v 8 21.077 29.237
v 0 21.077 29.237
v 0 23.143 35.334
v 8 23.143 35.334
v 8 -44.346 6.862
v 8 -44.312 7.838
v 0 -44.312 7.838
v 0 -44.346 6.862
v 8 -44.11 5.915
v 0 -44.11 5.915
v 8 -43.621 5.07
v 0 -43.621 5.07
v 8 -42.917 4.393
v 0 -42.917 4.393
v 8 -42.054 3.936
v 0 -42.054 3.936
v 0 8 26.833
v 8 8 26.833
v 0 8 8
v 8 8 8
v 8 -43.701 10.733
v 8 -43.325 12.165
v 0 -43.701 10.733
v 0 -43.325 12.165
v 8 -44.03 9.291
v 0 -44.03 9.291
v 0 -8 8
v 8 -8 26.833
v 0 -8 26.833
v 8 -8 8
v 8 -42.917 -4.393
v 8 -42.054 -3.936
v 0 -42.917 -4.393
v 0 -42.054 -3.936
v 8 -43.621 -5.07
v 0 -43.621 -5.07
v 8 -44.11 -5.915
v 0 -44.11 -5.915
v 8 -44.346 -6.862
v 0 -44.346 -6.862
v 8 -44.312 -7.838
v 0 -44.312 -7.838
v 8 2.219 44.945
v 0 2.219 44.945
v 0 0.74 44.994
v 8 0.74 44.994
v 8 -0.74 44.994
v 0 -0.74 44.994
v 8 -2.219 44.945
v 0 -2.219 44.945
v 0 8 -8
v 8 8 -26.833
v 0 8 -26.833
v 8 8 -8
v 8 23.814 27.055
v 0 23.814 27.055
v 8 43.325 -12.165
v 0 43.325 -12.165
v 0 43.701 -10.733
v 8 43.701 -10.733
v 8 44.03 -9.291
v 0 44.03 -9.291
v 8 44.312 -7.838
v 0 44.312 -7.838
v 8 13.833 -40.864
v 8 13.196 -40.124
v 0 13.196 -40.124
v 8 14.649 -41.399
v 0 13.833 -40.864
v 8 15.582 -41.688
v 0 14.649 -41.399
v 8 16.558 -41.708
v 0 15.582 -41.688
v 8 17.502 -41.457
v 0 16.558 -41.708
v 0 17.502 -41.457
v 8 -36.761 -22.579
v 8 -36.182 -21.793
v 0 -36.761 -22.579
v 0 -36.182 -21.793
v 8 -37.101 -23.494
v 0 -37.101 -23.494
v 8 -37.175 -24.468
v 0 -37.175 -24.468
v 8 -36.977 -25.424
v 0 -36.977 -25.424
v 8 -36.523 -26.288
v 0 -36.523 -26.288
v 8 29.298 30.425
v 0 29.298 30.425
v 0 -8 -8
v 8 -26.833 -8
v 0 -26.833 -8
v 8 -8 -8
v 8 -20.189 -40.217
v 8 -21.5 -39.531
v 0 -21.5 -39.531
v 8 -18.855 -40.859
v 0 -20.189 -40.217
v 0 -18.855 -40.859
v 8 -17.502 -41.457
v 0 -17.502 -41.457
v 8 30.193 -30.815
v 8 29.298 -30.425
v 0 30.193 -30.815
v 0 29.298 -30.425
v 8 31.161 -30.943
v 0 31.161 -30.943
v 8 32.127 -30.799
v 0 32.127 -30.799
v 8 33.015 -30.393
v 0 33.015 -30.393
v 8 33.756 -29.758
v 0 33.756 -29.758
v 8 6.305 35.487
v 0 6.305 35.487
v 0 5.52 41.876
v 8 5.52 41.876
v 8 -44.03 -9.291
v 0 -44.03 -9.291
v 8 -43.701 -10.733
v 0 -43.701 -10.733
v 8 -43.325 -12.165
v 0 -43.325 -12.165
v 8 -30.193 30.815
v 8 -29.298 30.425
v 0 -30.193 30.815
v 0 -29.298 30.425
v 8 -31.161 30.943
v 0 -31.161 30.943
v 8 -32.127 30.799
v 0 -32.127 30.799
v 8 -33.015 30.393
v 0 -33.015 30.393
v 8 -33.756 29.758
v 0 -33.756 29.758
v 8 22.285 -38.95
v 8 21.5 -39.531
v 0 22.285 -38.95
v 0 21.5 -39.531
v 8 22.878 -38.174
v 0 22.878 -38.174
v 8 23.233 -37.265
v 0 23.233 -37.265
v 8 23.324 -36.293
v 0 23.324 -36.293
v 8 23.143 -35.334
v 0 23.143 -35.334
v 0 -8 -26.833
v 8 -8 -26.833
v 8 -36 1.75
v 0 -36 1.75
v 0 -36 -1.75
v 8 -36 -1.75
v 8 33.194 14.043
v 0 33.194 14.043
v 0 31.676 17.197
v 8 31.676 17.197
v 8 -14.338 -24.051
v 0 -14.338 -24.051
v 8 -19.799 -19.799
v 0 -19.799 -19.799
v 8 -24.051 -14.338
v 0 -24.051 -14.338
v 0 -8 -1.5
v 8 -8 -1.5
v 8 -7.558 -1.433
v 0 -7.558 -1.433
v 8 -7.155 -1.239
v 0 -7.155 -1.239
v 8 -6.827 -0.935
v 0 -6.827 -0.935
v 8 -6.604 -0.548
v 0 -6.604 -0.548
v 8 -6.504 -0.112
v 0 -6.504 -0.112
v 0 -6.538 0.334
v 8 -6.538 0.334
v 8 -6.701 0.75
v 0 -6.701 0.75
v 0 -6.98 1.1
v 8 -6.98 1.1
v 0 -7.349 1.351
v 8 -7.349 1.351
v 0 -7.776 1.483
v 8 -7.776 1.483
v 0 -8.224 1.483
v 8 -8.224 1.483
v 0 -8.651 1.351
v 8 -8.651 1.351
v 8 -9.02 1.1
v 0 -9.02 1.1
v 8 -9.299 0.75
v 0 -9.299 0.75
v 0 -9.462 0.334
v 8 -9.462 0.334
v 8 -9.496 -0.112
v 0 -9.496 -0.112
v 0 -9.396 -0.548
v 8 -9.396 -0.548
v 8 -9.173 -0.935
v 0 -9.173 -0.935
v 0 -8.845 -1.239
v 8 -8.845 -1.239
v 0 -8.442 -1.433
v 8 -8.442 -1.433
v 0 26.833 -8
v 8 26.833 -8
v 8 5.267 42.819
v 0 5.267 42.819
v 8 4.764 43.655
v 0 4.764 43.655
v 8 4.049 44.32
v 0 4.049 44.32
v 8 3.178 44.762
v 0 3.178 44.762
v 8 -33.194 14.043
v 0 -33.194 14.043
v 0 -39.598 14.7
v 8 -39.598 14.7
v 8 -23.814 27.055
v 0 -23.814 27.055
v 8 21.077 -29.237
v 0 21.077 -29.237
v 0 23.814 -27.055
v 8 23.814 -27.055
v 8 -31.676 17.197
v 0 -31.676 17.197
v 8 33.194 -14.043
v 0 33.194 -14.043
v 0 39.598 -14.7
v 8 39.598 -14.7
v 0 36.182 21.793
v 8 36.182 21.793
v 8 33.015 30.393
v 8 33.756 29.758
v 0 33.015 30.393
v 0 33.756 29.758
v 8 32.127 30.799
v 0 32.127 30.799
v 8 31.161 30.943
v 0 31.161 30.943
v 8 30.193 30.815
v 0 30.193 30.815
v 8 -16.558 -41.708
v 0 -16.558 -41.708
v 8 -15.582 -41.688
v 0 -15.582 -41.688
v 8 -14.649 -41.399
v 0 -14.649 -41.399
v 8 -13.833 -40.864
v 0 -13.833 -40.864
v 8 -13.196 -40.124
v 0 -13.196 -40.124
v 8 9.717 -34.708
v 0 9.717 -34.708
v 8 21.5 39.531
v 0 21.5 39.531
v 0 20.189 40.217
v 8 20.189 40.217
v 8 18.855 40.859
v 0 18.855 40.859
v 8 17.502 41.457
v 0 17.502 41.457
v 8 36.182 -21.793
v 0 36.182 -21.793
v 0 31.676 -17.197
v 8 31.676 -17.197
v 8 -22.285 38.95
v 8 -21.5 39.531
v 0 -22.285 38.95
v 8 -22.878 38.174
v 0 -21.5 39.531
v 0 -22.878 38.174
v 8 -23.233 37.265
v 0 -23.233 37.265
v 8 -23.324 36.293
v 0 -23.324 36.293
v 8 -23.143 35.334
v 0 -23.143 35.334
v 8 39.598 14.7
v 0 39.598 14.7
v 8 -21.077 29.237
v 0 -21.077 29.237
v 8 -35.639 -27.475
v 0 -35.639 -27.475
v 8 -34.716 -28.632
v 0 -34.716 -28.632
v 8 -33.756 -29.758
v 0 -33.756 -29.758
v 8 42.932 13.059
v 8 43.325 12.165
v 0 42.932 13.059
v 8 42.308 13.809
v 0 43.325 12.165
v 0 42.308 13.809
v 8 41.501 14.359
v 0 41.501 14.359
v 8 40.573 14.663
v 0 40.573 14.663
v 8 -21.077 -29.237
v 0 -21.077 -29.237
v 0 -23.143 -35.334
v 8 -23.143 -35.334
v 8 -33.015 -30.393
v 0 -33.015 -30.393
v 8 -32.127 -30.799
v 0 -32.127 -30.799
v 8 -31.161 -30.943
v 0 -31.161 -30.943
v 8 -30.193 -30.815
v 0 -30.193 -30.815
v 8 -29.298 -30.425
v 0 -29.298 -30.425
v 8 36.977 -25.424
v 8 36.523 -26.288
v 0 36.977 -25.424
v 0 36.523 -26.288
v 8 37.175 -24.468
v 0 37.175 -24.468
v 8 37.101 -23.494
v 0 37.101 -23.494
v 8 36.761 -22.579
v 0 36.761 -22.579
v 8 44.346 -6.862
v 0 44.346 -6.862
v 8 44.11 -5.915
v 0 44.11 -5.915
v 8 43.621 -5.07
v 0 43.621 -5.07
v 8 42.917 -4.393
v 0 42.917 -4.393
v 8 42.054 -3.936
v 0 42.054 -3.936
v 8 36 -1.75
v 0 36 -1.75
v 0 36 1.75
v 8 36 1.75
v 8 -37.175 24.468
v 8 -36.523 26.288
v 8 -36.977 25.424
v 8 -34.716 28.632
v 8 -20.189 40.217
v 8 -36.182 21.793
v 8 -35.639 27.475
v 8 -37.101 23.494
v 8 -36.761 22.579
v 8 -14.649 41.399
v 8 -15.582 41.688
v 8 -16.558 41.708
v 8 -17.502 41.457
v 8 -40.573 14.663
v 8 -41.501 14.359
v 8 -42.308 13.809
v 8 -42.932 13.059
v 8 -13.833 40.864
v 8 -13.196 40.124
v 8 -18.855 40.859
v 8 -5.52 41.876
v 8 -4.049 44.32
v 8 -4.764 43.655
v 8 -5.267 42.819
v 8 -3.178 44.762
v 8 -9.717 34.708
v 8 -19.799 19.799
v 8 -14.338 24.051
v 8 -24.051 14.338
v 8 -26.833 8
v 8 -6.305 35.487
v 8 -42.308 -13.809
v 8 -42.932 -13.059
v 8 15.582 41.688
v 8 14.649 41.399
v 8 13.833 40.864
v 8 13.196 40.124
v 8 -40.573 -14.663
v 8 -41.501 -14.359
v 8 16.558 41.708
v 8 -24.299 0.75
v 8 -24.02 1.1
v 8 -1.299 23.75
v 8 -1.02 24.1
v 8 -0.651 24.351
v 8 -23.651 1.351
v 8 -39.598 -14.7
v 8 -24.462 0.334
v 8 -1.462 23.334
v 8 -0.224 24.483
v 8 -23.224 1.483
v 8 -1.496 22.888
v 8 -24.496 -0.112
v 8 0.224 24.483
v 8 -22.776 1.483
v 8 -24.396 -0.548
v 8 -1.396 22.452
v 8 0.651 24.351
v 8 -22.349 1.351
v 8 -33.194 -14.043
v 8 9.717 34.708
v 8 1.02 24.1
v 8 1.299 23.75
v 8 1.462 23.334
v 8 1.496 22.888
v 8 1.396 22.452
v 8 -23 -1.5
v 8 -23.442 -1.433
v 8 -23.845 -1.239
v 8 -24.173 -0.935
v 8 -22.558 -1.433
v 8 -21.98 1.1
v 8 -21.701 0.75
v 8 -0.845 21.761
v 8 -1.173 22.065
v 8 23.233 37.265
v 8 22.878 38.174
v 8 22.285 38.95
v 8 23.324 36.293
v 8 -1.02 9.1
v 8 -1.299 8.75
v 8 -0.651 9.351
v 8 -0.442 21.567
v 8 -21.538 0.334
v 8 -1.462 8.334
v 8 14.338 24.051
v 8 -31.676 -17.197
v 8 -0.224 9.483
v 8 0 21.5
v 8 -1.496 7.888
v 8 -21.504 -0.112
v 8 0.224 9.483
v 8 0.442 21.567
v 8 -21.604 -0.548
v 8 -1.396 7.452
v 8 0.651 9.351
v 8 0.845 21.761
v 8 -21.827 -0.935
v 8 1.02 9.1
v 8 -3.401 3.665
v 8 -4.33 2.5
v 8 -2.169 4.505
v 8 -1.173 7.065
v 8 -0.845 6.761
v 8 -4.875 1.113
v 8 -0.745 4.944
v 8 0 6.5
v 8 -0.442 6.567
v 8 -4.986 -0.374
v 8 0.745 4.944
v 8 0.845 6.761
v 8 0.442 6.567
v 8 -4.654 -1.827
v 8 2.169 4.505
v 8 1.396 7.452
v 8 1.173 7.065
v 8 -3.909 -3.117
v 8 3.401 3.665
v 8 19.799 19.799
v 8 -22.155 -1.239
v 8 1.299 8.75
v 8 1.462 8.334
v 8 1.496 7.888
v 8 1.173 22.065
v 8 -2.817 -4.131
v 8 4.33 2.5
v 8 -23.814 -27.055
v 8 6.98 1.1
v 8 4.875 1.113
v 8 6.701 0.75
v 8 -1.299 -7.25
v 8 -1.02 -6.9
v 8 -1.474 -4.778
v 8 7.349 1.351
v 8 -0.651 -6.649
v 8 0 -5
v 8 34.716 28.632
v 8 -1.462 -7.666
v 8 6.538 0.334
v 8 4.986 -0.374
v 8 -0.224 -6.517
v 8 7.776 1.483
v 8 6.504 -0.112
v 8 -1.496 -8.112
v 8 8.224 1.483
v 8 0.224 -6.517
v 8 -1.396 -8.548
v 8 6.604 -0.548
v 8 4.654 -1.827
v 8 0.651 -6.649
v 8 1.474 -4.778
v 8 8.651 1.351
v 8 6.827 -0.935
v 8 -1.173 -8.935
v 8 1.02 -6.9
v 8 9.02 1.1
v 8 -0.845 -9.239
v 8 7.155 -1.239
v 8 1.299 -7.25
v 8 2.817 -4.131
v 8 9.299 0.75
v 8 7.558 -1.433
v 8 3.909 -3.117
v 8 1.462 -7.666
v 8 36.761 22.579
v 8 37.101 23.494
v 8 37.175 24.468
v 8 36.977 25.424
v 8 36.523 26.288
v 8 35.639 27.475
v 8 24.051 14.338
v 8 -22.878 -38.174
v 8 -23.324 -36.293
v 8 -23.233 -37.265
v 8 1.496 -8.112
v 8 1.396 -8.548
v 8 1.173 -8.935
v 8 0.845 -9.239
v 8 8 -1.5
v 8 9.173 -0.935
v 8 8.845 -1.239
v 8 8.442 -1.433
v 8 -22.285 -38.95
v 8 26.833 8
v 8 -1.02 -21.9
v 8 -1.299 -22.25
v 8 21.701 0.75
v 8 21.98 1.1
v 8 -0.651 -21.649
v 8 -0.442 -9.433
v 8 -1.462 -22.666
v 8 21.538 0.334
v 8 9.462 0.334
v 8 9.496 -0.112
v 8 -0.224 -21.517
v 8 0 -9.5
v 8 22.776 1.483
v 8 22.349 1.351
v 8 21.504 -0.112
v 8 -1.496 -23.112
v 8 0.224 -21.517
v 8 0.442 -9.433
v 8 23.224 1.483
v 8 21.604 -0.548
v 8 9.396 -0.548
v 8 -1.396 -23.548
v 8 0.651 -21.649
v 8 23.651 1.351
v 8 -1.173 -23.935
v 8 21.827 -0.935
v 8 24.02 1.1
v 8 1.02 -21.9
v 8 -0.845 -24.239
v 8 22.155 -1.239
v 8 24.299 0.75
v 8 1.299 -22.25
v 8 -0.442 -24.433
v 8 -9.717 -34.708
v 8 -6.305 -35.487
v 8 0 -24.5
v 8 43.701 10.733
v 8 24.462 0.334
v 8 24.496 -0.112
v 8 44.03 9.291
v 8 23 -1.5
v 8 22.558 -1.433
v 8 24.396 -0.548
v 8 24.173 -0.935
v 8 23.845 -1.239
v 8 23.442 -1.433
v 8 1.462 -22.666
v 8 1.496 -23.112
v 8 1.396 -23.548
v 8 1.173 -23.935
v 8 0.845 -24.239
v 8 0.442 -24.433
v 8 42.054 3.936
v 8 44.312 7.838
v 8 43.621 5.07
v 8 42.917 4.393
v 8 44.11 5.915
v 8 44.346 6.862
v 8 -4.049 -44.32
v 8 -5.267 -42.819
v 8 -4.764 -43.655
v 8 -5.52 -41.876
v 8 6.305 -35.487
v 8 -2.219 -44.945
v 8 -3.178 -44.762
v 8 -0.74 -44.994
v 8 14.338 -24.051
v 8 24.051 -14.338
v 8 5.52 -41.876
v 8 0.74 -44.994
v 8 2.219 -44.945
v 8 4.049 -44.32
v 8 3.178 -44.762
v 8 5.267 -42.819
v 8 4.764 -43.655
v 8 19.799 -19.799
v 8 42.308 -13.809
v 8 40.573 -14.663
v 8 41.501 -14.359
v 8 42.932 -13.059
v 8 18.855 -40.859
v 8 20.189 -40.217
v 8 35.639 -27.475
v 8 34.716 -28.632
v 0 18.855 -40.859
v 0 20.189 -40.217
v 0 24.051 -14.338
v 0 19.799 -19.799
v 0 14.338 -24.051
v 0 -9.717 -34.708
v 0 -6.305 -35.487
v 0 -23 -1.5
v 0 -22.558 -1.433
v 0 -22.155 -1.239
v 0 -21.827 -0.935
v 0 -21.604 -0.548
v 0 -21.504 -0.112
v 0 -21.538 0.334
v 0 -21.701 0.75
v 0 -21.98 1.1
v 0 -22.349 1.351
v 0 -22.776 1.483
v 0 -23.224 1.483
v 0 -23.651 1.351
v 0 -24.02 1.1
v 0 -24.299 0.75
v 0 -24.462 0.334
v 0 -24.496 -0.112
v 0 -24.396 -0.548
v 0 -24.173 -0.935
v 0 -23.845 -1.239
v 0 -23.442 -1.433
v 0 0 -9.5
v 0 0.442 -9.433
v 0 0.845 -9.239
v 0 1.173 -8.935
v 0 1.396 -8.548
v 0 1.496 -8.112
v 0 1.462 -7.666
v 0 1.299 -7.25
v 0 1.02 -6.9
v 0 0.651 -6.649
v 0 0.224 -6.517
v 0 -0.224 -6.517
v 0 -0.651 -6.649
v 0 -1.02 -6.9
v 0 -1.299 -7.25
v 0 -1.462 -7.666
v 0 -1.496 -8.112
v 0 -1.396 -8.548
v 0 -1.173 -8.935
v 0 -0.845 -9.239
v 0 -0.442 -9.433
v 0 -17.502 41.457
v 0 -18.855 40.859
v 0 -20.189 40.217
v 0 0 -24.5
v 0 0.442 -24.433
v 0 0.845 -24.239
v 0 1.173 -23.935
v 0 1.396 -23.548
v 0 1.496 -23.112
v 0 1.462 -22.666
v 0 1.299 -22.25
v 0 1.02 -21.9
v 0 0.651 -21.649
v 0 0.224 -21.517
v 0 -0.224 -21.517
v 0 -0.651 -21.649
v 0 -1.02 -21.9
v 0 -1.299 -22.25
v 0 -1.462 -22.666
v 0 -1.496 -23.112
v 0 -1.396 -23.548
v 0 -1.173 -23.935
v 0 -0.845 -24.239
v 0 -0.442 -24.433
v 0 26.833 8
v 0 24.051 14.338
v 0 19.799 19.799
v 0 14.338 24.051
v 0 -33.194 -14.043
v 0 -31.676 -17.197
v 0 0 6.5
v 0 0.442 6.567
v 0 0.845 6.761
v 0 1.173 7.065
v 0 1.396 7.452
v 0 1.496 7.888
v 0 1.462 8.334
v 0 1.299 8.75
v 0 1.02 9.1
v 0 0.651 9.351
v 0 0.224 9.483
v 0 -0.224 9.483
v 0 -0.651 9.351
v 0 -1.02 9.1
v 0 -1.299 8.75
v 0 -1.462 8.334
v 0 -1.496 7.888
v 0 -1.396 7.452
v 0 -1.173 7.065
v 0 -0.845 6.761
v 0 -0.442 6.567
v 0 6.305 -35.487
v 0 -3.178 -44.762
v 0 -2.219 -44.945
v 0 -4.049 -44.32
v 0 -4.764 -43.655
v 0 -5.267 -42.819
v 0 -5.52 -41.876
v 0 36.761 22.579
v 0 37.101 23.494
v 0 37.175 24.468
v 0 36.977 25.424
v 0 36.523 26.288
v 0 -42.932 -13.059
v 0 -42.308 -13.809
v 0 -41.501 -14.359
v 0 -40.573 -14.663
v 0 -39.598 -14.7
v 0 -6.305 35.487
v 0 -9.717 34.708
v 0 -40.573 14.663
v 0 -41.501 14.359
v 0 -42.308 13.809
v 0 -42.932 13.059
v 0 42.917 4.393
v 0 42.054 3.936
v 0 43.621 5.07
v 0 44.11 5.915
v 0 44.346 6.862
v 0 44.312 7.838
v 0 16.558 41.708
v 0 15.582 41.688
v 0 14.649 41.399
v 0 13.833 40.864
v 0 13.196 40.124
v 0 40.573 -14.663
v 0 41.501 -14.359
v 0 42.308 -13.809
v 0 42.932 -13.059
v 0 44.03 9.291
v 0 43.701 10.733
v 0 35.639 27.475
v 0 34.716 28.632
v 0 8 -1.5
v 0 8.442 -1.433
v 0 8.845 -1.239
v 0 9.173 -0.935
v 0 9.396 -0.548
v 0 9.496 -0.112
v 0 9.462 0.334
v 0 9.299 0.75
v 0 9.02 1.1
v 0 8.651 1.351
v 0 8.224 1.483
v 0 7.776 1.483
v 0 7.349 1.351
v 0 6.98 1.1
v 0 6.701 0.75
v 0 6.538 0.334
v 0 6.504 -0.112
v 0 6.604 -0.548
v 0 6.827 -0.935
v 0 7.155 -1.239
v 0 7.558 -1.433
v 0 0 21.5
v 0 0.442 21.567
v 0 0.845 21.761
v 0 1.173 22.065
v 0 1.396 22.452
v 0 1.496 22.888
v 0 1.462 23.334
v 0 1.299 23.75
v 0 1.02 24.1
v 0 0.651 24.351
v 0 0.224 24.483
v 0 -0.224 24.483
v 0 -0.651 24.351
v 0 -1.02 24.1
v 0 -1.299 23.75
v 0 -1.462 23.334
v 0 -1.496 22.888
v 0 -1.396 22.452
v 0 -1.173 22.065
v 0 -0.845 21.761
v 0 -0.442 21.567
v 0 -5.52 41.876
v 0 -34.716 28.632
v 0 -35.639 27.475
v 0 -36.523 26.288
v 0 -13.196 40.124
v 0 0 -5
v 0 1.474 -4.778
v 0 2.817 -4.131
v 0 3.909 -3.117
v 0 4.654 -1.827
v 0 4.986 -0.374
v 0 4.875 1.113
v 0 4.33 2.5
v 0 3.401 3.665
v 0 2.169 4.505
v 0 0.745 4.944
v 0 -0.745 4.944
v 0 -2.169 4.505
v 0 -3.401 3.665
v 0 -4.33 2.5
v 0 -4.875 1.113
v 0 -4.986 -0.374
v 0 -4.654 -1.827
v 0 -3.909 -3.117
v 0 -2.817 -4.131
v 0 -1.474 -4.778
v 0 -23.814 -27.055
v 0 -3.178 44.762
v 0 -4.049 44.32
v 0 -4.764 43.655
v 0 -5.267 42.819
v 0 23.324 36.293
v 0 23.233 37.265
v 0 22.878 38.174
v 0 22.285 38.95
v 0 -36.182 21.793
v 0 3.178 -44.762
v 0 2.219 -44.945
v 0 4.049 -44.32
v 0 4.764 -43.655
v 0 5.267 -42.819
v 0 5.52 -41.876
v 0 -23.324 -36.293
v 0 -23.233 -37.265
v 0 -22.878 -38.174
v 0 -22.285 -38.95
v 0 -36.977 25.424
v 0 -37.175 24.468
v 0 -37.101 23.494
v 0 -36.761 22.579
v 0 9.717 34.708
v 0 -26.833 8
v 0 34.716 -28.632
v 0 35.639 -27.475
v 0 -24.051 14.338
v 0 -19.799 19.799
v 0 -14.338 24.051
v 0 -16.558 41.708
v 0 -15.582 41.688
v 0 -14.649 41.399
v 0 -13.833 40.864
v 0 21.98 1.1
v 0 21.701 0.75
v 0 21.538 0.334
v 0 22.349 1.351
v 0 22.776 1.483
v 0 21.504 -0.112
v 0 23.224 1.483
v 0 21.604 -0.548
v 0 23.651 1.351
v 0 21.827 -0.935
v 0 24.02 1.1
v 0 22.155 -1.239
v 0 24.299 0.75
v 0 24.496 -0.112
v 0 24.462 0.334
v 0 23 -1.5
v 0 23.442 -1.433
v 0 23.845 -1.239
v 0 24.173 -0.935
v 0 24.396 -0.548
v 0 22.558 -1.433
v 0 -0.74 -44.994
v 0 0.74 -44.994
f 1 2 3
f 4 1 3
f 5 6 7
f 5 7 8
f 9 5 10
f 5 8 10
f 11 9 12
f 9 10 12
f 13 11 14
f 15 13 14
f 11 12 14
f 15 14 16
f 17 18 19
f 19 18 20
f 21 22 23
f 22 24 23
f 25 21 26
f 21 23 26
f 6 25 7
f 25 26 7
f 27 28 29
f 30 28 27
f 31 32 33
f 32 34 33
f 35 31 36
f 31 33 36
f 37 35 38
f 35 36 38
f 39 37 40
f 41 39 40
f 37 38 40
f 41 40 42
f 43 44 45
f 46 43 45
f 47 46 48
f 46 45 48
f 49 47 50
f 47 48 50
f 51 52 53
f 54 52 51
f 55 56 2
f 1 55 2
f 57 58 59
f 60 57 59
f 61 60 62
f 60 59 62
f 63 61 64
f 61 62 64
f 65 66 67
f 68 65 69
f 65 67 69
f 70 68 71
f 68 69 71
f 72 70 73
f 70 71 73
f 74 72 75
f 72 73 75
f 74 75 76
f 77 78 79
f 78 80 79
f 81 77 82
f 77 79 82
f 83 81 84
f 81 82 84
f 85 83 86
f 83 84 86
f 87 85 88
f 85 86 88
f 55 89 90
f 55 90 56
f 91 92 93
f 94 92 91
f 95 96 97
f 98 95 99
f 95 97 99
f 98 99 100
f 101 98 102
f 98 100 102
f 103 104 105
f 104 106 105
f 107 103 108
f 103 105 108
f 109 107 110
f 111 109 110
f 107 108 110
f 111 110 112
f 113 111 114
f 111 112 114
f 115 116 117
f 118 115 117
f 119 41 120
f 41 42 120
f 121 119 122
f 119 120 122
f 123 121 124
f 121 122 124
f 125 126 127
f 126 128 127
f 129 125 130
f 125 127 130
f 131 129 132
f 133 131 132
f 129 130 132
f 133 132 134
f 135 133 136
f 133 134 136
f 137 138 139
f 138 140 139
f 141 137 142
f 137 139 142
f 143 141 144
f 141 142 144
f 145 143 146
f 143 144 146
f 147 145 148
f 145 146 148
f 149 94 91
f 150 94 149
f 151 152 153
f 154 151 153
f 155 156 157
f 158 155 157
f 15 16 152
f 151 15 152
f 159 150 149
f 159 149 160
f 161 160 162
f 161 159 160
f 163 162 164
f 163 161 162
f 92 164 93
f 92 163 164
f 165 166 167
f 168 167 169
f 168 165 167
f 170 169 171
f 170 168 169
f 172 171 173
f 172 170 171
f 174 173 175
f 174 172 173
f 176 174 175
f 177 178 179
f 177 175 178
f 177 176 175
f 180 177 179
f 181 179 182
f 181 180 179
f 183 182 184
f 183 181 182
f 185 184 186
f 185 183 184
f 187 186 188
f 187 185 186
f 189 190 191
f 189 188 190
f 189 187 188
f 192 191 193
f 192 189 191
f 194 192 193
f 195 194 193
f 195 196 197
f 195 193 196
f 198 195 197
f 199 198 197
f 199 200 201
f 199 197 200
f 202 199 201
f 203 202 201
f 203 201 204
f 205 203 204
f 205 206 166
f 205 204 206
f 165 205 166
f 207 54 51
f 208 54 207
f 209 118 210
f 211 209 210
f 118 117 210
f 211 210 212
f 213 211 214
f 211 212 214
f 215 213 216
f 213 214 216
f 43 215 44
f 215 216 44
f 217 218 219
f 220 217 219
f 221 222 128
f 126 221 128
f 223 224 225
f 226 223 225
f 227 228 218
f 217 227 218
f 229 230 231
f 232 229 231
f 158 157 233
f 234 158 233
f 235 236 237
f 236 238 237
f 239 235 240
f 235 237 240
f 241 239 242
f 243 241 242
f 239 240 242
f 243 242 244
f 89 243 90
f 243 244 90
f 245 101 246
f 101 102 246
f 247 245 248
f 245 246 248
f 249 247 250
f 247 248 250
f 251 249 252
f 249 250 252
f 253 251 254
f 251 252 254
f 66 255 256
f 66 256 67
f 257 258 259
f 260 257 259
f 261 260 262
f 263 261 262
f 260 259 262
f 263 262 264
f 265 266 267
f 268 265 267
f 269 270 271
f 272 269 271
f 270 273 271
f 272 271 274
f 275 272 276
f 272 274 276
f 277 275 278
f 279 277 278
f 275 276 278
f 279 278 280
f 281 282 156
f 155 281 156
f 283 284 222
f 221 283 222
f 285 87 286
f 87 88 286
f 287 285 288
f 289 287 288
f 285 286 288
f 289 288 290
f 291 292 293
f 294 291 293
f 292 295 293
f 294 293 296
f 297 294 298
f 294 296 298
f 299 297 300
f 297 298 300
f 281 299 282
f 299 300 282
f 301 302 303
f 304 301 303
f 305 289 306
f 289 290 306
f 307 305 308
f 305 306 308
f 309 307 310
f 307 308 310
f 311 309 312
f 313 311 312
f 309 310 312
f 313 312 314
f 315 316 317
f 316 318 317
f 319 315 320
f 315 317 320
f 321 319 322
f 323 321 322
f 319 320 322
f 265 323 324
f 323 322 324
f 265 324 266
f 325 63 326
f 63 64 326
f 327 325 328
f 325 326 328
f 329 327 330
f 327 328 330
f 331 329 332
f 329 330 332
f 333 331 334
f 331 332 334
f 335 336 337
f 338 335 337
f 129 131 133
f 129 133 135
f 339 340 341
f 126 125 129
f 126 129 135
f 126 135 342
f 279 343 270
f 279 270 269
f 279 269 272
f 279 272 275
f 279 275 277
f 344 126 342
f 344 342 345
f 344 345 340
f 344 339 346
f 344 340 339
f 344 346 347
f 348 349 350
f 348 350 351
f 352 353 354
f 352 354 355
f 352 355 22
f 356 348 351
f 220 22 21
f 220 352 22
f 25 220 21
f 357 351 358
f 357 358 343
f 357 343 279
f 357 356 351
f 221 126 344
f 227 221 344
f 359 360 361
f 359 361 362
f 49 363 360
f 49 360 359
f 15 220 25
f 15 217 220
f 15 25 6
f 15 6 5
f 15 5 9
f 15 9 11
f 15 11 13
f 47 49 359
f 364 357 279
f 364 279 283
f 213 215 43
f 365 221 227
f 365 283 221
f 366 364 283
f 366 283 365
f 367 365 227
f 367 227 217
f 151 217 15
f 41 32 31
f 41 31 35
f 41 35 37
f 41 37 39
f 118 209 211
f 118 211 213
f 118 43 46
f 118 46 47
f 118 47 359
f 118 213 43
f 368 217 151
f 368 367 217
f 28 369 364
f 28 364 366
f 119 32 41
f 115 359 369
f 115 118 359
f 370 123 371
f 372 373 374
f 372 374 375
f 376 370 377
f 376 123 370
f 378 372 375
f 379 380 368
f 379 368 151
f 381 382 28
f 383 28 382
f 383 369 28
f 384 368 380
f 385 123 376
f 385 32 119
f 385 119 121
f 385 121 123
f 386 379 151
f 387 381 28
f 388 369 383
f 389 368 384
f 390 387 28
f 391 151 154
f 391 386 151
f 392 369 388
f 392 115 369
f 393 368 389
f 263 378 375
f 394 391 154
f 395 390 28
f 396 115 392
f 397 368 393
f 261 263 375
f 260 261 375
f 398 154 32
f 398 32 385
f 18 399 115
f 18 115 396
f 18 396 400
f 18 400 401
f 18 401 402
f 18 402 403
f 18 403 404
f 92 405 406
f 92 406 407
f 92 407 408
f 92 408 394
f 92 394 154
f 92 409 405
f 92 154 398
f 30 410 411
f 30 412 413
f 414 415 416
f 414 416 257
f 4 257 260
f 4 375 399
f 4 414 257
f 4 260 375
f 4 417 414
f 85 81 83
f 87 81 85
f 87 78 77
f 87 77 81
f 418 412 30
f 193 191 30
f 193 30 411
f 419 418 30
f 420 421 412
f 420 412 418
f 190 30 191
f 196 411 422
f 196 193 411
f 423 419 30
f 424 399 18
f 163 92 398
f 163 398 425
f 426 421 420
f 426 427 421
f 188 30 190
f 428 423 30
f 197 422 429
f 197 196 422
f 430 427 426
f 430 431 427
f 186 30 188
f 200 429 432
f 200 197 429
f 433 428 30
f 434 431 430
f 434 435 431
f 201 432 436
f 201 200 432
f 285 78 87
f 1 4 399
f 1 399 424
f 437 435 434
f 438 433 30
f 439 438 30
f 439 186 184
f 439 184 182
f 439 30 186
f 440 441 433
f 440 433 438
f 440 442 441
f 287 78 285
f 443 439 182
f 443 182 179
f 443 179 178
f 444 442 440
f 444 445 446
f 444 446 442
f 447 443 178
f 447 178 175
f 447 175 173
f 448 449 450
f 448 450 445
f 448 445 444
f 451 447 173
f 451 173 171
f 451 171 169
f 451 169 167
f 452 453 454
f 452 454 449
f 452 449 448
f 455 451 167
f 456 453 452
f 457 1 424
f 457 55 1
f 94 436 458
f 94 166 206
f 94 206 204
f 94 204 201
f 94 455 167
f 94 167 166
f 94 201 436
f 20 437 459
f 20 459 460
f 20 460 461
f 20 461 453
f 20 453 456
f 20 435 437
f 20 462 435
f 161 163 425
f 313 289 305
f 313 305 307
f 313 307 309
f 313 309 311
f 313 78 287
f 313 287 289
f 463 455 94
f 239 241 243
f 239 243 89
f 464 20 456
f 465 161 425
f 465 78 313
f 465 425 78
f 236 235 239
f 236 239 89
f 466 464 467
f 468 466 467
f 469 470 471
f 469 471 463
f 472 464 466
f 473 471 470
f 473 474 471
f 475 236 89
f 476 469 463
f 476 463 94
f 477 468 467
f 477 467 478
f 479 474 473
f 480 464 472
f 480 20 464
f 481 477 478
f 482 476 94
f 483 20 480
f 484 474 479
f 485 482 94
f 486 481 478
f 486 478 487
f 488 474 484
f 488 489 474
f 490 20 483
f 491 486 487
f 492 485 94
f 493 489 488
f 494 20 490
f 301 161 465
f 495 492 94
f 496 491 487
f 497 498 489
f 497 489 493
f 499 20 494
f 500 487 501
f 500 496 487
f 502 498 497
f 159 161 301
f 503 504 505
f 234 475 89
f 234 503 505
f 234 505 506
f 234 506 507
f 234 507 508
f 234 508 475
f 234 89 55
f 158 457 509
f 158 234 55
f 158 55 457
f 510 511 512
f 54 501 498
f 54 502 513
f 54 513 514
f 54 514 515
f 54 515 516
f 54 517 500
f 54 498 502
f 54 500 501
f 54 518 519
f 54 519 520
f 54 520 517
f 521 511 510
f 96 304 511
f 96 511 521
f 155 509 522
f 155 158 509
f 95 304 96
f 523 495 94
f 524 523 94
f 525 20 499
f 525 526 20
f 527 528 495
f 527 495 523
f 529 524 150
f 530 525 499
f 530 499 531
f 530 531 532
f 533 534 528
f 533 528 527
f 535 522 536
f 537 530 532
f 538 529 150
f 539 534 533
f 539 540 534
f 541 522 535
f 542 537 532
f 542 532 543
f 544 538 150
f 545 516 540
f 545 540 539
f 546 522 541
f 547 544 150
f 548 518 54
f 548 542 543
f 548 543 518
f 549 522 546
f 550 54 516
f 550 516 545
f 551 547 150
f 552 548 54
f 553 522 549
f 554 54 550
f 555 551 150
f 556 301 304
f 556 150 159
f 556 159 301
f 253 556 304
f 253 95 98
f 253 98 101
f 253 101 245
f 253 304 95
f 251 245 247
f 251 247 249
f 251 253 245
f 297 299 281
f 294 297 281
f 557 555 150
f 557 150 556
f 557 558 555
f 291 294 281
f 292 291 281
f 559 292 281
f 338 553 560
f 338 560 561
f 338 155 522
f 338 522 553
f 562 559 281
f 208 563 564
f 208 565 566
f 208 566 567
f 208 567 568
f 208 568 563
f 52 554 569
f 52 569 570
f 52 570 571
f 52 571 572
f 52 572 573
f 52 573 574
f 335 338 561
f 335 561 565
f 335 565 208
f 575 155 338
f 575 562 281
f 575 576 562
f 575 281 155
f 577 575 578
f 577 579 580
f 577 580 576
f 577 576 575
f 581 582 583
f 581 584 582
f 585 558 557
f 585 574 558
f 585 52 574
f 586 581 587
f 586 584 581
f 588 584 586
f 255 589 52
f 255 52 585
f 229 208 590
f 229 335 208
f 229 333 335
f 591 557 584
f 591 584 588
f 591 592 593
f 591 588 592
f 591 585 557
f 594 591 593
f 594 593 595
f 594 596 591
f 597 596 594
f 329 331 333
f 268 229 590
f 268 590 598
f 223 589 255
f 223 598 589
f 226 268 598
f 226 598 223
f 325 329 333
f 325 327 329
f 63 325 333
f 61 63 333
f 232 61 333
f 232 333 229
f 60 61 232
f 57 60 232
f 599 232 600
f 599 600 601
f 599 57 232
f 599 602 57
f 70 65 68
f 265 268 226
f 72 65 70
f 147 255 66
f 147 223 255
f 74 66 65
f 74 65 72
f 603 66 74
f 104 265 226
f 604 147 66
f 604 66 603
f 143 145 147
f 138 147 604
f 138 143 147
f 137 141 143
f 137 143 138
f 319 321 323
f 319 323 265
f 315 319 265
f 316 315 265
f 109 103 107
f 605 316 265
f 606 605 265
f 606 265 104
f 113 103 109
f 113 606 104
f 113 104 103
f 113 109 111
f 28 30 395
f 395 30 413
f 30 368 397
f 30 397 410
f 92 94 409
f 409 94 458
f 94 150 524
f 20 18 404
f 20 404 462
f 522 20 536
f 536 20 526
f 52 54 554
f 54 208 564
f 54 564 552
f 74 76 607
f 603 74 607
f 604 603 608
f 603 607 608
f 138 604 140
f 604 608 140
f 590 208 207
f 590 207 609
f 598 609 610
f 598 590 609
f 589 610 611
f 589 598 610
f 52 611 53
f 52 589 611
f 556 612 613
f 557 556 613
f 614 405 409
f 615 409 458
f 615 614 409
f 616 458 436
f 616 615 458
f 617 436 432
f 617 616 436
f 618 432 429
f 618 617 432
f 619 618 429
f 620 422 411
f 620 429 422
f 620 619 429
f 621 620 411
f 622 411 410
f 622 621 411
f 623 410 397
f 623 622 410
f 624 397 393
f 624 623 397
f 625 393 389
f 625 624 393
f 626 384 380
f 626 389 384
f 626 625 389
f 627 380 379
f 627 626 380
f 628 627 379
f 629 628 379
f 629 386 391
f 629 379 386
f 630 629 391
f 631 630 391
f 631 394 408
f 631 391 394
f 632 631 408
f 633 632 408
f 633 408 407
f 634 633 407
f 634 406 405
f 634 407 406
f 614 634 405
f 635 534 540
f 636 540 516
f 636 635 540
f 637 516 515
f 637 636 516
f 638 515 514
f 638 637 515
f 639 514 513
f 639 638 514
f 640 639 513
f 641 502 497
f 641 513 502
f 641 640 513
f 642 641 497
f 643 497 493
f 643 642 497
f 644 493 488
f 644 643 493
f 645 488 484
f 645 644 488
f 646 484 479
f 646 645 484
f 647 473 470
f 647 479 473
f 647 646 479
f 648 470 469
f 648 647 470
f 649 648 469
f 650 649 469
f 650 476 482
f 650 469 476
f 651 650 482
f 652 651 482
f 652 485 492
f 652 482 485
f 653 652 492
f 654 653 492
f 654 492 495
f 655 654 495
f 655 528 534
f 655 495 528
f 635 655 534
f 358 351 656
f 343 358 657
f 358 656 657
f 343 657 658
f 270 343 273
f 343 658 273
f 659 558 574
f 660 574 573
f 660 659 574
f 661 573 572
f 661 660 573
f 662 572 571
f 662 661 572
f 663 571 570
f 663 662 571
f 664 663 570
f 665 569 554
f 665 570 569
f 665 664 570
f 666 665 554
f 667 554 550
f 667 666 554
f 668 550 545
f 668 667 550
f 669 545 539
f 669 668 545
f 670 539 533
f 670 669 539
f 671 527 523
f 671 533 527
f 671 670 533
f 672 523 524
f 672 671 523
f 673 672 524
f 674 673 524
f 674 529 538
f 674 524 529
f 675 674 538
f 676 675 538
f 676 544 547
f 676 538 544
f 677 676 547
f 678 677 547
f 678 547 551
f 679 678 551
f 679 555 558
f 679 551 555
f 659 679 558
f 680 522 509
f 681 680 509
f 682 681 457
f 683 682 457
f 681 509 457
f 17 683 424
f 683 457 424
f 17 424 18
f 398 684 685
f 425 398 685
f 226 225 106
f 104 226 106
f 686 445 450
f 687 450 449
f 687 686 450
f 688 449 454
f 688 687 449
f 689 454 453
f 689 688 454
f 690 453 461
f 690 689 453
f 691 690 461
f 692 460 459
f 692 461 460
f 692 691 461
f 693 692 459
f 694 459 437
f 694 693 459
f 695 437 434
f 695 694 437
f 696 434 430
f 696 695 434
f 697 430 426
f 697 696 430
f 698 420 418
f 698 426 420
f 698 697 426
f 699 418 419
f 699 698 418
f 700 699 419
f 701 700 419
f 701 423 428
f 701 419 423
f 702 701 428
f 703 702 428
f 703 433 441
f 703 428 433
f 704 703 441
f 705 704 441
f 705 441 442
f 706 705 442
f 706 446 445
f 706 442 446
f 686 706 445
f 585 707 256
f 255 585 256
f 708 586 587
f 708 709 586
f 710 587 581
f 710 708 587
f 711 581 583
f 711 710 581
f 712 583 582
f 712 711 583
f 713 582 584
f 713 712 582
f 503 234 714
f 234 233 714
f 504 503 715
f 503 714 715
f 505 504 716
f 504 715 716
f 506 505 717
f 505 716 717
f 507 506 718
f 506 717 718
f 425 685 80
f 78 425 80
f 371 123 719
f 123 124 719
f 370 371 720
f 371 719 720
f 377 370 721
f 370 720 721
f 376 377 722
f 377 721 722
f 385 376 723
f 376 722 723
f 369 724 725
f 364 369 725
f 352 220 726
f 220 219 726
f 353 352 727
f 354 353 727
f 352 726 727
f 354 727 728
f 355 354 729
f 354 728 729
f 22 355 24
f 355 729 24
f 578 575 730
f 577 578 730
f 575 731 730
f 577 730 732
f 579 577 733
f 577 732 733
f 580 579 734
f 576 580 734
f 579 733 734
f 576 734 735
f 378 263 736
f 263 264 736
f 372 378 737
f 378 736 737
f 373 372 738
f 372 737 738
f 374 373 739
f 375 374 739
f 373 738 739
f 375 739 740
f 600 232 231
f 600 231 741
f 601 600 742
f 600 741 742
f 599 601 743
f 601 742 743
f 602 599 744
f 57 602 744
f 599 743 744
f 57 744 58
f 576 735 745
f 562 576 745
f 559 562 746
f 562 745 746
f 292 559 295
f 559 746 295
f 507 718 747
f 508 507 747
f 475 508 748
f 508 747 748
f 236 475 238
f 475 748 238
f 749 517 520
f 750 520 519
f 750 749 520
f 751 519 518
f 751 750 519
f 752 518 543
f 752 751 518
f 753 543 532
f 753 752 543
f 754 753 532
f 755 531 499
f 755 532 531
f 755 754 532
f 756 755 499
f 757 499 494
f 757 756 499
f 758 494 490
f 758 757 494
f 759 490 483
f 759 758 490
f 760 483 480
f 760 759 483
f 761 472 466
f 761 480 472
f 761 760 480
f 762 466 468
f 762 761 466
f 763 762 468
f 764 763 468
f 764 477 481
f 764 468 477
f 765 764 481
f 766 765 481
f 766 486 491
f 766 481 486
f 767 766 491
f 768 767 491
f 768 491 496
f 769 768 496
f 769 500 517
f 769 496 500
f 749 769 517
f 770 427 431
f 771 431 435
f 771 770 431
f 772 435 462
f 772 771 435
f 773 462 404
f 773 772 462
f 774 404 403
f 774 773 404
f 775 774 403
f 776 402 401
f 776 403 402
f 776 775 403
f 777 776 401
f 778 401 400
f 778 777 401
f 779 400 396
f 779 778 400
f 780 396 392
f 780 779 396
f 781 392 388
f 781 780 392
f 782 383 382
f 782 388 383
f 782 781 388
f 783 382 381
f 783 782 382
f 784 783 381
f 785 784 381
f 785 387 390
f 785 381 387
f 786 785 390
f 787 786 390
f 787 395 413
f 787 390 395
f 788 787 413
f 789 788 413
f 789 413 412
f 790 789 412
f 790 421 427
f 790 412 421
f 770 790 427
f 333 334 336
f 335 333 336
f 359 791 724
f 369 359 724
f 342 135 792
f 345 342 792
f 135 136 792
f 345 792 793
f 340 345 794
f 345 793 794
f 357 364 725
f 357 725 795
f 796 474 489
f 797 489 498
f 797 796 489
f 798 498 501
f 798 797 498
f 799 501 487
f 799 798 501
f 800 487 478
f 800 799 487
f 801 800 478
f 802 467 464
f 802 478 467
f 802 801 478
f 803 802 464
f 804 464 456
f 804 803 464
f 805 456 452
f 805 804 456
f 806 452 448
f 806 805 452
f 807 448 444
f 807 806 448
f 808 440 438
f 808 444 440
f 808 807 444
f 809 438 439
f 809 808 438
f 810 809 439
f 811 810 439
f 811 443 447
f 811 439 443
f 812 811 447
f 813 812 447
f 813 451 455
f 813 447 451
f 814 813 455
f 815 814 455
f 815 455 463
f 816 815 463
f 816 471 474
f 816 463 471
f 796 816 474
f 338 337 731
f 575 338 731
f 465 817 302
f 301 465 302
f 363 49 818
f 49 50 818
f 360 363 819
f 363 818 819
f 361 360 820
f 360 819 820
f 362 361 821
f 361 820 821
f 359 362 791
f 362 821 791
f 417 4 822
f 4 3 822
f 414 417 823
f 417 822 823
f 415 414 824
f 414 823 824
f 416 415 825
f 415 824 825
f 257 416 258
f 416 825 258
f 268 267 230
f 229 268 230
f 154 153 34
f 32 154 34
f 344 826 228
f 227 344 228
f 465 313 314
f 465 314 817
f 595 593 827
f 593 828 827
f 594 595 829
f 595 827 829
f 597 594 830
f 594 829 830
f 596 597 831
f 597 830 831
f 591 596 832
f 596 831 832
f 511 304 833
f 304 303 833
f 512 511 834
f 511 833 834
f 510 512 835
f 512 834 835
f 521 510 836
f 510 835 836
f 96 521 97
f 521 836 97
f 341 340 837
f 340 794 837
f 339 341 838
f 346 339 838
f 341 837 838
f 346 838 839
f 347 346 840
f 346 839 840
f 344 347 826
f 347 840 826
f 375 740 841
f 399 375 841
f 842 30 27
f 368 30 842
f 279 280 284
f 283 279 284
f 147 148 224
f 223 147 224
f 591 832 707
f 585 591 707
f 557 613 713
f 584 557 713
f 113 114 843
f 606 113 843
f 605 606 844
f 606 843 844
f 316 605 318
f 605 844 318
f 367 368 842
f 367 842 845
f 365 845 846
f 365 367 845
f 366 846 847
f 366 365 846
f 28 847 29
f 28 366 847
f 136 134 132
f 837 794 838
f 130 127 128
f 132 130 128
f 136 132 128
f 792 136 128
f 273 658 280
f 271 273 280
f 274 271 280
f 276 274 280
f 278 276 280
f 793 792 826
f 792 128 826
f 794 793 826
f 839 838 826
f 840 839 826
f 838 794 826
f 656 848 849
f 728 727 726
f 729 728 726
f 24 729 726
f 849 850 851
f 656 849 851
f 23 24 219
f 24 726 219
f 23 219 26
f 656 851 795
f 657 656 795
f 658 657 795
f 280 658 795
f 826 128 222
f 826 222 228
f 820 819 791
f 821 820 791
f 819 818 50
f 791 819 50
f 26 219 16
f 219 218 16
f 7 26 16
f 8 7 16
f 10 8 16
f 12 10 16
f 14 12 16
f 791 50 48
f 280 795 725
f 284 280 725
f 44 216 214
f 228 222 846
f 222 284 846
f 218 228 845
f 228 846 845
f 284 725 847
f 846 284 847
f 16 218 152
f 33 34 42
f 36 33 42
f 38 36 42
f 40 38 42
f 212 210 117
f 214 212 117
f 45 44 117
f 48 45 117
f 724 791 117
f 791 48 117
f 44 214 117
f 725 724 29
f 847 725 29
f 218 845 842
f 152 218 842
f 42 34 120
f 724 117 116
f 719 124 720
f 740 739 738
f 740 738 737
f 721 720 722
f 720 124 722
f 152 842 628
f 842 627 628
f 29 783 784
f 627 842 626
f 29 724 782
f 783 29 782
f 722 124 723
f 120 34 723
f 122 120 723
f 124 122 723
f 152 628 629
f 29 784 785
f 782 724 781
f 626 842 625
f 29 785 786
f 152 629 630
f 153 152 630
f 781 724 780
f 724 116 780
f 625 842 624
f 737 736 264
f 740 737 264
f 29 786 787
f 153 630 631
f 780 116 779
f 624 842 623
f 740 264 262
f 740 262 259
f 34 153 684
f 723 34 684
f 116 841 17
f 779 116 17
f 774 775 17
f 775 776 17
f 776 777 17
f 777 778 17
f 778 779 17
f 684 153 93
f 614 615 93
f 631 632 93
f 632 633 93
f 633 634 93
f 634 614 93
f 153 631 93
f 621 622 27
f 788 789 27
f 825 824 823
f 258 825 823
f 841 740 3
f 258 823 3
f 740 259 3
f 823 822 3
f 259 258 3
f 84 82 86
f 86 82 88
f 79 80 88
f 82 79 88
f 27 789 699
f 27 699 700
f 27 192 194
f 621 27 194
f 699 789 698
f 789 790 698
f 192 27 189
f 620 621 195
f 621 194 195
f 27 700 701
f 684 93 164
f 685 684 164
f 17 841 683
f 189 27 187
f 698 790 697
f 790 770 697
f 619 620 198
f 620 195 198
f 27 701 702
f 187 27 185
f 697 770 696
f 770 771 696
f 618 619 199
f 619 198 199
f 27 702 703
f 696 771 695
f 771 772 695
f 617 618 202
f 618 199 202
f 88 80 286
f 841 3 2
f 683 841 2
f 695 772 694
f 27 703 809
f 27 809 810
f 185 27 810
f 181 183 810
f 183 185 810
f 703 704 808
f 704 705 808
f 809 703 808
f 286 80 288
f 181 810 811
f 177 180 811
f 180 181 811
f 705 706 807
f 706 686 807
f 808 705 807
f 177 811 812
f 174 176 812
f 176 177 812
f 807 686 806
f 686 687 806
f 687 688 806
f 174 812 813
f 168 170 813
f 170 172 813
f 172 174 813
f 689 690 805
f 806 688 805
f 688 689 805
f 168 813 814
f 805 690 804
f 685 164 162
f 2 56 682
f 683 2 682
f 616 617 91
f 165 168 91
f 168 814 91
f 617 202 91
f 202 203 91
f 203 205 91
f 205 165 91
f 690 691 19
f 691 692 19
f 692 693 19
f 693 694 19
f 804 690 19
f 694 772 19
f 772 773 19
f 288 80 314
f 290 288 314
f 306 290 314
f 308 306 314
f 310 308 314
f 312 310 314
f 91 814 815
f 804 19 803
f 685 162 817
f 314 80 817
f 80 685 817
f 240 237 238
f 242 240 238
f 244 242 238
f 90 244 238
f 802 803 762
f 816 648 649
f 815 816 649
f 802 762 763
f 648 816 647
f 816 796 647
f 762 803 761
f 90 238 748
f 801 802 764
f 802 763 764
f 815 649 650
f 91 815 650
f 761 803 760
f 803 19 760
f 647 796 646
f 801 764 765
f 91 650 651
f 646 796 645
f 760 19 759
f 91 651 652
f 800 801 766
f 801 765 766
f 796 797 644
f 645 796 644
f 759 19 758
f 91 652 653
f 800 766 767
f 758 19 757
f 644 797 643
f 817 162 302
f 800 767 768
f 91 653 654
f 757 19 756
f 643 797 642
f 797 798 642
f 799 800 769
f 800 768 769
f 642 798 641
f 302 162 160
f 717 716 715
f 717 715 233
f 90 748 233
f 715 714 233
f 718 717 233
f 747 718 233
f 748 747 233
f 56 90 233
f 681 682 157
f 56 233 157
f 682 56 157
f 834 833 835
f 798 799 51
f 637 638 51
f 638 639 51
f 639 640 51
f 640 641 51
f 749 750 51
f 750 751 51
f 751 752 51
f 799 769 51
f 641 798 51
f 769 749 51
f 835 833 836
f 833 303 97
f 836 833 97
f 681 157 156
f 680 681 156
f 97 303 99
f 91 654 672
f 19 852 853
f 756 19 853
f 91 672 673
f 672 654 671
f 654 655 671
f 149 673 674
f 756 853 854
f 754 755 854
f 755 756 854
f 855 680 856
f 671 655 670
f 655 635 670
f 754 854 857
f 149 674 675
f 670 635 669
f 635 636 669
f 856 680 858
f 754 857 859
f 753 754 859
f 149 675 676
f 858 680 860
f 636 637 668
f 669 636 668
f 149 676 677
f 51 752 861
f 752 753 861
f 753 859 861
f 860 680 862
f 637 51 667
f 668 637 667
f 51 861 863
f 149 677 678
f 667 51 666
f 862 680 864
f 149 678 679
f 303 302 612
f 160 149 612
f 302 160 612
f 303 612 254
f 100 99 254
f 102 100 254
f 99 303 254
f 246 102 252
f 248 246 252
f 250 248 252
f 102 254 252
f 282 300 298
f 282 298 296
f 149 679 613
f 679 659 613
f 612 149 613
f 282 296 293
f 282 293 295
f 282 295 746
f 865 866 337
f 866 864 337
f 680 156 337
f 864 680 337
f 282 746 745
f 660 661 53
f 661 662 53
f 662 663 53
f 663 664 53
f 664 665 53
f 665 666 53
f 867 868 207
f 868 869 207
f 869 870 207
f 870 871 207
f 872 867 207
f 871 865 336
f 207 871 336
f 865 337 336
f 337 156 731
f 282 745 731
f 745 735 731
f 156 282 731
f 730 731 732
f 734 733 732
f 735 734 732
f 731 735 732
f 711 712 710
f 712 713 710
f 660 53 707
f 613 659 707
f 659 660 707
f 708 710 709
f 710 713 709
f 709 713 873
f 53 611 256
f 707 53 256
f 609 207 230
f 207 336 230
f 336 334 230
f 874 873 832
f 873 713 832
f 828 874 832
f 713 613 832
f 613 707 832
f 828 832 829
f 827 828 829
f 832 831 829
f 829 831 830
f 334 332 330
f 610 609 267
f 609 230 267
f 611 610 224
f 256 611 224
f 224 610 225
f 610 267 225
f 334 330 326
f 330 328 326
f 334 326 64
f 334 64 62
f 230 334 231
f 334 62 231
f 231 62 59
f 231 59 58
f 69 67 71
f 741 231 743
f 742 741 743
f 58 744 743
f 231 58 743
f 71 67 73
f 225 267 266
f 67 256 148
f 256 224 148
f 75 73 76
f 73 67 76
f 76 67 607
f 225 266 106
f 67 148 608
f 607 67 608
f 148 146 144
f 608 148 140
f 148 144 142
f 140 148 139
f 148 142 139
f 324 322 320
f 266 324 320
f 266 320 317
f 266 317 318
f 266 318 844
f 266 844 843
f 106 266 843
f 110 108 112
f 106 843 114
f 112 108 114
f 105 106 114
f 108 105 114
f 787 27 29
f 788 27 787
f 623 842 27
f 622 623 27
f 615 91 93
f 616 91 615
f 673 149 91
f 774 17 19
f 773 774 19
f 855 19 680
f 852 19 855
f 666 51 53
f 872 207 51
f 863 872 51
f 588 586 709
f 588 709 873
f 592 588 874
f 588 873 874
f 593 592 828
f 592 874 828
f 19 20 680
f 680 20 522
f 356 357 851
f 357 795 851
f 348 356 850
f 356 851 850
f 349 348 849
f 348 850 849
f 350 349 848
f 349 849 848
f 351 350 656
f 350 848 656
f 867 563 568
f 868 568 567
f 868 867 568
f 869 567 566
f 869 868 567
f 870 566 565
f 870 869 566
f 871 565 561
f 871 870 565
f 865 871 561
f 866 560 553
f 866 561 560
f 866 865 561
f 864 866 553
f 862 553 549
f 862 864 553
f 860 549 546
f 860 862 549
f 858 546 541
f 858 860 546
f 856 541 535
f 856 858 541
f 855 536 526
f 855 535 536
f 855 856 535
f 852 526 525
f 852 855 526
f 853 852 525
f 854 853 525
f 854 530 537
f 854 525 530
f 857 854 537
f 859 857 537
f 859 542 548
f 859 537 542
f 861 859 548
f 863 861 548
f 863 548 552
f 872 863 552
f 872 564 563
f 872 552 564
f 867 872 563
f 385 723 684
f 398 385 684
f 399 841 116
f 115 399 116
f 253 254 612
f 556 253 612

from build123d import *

# Parameters (mm, degrees)
SPROCKET_R                   = 45
ESTRUSIONE_ESTRUSIONE2_DEPTH = 8
TAGLIO_ESTRUSIONE1_DEPTH     = 9
RACCORDO1_R                  = 3.5
SCHIZZO1_R                   = 5
SCHIZZO1_R_2                 = 1.5
TAGLIO_ESTRUSIONE2_DEPTH     = 9
TAGLIO_ESTRUSIONE3_DEPTH     = 9


with BuildPart() as part:
    # Sprocket → Estrusione-Estrusione2 (new body)
    with BuildSketch(Plane(origin=(0, 0, 0), x_dir=(0, 0, -1), z_dir=(1, 0, 0))):
        Circle(SPROCKET_R)
    extrude(amount=ESTRUSIONE_ESTRUSIONE2_DEPTH)

    # Tooth → Taglio-Estrusione1 (cut, through all)
    with BuildSketch(Plane(origin=(0, 0, 0), x_dir=(0, 0, -1), z_dir=(1, 0, 0))):
        Polygon((-5, 45), (5, 45), (1.75, 36), (-1.75, 36), align=None)
        Polygon((24.0296126, 38.37418036), (17.196510127, 31.675582701), (14.043119089, 33.194175788), (15.019923921, 42.713017751), align=None)
        Polygon((38.29986572, 24.147883671), (29.237040522, 21.077427773), (27.054826216, 23.813837961), (32.064967702, 31.966198496), align=None)
        Polygon((44.984360718, 5.138802467), (35.486816473, 6.304629776), (34.707993204, 9.716877469), (42.759151378, 14.888081589), align=None)
        Polygon((42.759151378, -14.888081589), (34.707993204, -9.716877469), (35.486816473, -6.304629776), (44.984360718, -5.138802467), align=None)
        Polygon((32.064967702, -31.966198496), (27.054826216, -23.813837961), (29.237040522, -21.077427773), (38.29986572, -24.147883671), align=None)
        Polygon((15.019923921, -42.713017751), (14.043119089, -33.194175788), (17.196510127, -31.675582701), (24.0296126, -38.37418036), align=None)
        Polygon((-5, -45), (-1.75, -36), (1.75, -36), (5, -45), align=None)
        Polygon((-24.0296126, -38.37418036), (-17.196510127, -31.675582701), (-14.043119089, -33.194175788), (-15.019923921, -42.713017751), align=None)
        Polygon((-38.29986572, -24.147883671), (-29.237040522, -21.077427773), (-27.054826216, -23.813837961), (-32.064967702, -31.966198496), align=None)
        Polygon((-44.984360718, -5.138802467), (-35.486816473, -6.304629776), (-34.707993204, -9.716877469), (-42.759151378, -14.888081589), align=None)
        Polygon((-42.759151378, 14.888081589), (-34.707993204, 9.716877469), (-35.486816473, 6.304629776), (-44.984360718, 5.138802467), align=None)
        Polygon((-32.064967702, 31.966198496), (-27.054826216, 23.813837961), (-29.237040522, 21.077427773), (-38.29986572, 24.147883671), align=None)
        Polygon((-15.019923921, 42.713017751), (-14.043119089, 33.194175788), (-17.196510127, 31.675582701), (-24.0296126, 38.37418036), align=None)
    extrude(amount=TAGLIO_ESTRUSIONE1_DEPTH, mode=Mode.SUBTRACT)

    # Raccordo1
    raccordo1_edges = [part.edges().sort_by_distance(p)[0] for p in [
        (4, -5.173509038, -44.701619705),
        (4, -14.734135321, -42.519469145),
        (4, -24.056476483, -38.030066253),
        (4, -31.723503477, -31.915816253),
        (4, 44.732070833, 4.903247801),
        (4, 44.732070833, -4.903247801),
        (4, -38.174763728, -23.826191772),
        (4, -42.429642707, -14.990844531),
        (4, -44.732070833, -4.903247801),
        (4, -44.732070833, 4.903247801),
        (4, -42.429642707, 14.990844531),
        (4, -38.174763728, 23.826191772),
        (4, -31.723503477, 31.915816253),
        (4, -24.056476483, 38.030066253),
        (4, -14.734135321, 42.519469145),
        (4, -5.173509038, 44.701619705),
        (4, 5.173509038, 44.701619705),
        (4, 14.734135321, 42.519469145),
        (4, 24.056476483, 38.030066253),
        (4, 31.723503477, 31.915816253),
        (4, 38.174763728, 23.826191772),
        (4, 42.429642707, 14.990844531),
        (4, 42.429642707, -14.990844531),
        (4, 38.174763728, -23.826191772),
        (4, 31.723503477, -31.915816253),
        (4, 24.056476483, -38.030066253),
        (4, 14.734135321, -42.519469145),
        (4, 5.173509038, -44.701619705),
    ]]
    fillet(raccordo1_edges, radius=RACCORDO1_R)

    # Schizzo1 → Taglio-Estrusione2 (cut, through all)
    with BuildSketch(Plane(origin=(0, 0, 0), x_dir=(0, 0, -1), z_dir=(1, 0, 0))):
        Circle(SCHIZZO1_R)
        with Locations((0, 8)):
            Circle(SCHIZZO1_R_2)
        with Locations((8, 0)):
            Circle(SCHIZZO1_R_2)
        with Locations((0, -8)):
            Circle(SCHIZZO1_R_2)
        with Locations((-8, 0)):
            Circle(SCHIZZO1_R_2)
        with Locations((0, 23)):
            Circle(SCHIZZO1_R_2)
        with Locations((23, 0)):
            Circle(SCHIZZO1_R_2)
        with Locations((0, -23)):
            Circle(SCHIZZO1_R_2)
        with Locations((-23, 0)):
            Circle(SCHIZZO1_R_2)
    extrude(amount=TAGLIO_ESTRUSIONE2_DEPTH, mode=Mode.SUBTRACT)

    # Schizzo2 → Taglio-Estrusione3 (cut, through all)
    with BuildSketch(Plane(origin=(8, 0, 0), x_dir=(0, 0, -1), z_dir=(1, 0, 0))):
        with BuildLine():
            Line((-26.83281573, 8), (-8, 8))
            Line((-8, 8), (-8, 26.83281573))
            ThreePointArc((-8, 26.83281573), (-19.798989873, 19.798989873), (-26.83281573, 8))
        make_face()
        with BuildLine():
            Line((26.83281573, 8), (8, 8))
            Line((8, 8), (8, 26.83281573))
            ThreePointArc((8, 26.83281573), (19.798989873, 19.798989873), (26.83281573, 8))
        make_face()
        with BuildLine():
            Line((8, -26.83281573), (8, -8))
            Line((8, -8), (26.83281573, -8))
            ThreePointArc((26.83281573, -8), (19.798989873, -19.798989873), (8, -26.83281573))
        make_face()
        with BuildLine():
            Line((-26.83281573, -8), (-8, -8))
            Line((-8, -8), (-8, -26.83281573))
            ThreePointArc((-8, -26.83281573), (-19.798989873, -19.798989873), (-26.83281573, -8))
        make_face()
    extrude(amount=-TAGLIO_ESTRUSIONE3_DEPTH, mode=Mode.SUBTRACT)


solid = part.part
